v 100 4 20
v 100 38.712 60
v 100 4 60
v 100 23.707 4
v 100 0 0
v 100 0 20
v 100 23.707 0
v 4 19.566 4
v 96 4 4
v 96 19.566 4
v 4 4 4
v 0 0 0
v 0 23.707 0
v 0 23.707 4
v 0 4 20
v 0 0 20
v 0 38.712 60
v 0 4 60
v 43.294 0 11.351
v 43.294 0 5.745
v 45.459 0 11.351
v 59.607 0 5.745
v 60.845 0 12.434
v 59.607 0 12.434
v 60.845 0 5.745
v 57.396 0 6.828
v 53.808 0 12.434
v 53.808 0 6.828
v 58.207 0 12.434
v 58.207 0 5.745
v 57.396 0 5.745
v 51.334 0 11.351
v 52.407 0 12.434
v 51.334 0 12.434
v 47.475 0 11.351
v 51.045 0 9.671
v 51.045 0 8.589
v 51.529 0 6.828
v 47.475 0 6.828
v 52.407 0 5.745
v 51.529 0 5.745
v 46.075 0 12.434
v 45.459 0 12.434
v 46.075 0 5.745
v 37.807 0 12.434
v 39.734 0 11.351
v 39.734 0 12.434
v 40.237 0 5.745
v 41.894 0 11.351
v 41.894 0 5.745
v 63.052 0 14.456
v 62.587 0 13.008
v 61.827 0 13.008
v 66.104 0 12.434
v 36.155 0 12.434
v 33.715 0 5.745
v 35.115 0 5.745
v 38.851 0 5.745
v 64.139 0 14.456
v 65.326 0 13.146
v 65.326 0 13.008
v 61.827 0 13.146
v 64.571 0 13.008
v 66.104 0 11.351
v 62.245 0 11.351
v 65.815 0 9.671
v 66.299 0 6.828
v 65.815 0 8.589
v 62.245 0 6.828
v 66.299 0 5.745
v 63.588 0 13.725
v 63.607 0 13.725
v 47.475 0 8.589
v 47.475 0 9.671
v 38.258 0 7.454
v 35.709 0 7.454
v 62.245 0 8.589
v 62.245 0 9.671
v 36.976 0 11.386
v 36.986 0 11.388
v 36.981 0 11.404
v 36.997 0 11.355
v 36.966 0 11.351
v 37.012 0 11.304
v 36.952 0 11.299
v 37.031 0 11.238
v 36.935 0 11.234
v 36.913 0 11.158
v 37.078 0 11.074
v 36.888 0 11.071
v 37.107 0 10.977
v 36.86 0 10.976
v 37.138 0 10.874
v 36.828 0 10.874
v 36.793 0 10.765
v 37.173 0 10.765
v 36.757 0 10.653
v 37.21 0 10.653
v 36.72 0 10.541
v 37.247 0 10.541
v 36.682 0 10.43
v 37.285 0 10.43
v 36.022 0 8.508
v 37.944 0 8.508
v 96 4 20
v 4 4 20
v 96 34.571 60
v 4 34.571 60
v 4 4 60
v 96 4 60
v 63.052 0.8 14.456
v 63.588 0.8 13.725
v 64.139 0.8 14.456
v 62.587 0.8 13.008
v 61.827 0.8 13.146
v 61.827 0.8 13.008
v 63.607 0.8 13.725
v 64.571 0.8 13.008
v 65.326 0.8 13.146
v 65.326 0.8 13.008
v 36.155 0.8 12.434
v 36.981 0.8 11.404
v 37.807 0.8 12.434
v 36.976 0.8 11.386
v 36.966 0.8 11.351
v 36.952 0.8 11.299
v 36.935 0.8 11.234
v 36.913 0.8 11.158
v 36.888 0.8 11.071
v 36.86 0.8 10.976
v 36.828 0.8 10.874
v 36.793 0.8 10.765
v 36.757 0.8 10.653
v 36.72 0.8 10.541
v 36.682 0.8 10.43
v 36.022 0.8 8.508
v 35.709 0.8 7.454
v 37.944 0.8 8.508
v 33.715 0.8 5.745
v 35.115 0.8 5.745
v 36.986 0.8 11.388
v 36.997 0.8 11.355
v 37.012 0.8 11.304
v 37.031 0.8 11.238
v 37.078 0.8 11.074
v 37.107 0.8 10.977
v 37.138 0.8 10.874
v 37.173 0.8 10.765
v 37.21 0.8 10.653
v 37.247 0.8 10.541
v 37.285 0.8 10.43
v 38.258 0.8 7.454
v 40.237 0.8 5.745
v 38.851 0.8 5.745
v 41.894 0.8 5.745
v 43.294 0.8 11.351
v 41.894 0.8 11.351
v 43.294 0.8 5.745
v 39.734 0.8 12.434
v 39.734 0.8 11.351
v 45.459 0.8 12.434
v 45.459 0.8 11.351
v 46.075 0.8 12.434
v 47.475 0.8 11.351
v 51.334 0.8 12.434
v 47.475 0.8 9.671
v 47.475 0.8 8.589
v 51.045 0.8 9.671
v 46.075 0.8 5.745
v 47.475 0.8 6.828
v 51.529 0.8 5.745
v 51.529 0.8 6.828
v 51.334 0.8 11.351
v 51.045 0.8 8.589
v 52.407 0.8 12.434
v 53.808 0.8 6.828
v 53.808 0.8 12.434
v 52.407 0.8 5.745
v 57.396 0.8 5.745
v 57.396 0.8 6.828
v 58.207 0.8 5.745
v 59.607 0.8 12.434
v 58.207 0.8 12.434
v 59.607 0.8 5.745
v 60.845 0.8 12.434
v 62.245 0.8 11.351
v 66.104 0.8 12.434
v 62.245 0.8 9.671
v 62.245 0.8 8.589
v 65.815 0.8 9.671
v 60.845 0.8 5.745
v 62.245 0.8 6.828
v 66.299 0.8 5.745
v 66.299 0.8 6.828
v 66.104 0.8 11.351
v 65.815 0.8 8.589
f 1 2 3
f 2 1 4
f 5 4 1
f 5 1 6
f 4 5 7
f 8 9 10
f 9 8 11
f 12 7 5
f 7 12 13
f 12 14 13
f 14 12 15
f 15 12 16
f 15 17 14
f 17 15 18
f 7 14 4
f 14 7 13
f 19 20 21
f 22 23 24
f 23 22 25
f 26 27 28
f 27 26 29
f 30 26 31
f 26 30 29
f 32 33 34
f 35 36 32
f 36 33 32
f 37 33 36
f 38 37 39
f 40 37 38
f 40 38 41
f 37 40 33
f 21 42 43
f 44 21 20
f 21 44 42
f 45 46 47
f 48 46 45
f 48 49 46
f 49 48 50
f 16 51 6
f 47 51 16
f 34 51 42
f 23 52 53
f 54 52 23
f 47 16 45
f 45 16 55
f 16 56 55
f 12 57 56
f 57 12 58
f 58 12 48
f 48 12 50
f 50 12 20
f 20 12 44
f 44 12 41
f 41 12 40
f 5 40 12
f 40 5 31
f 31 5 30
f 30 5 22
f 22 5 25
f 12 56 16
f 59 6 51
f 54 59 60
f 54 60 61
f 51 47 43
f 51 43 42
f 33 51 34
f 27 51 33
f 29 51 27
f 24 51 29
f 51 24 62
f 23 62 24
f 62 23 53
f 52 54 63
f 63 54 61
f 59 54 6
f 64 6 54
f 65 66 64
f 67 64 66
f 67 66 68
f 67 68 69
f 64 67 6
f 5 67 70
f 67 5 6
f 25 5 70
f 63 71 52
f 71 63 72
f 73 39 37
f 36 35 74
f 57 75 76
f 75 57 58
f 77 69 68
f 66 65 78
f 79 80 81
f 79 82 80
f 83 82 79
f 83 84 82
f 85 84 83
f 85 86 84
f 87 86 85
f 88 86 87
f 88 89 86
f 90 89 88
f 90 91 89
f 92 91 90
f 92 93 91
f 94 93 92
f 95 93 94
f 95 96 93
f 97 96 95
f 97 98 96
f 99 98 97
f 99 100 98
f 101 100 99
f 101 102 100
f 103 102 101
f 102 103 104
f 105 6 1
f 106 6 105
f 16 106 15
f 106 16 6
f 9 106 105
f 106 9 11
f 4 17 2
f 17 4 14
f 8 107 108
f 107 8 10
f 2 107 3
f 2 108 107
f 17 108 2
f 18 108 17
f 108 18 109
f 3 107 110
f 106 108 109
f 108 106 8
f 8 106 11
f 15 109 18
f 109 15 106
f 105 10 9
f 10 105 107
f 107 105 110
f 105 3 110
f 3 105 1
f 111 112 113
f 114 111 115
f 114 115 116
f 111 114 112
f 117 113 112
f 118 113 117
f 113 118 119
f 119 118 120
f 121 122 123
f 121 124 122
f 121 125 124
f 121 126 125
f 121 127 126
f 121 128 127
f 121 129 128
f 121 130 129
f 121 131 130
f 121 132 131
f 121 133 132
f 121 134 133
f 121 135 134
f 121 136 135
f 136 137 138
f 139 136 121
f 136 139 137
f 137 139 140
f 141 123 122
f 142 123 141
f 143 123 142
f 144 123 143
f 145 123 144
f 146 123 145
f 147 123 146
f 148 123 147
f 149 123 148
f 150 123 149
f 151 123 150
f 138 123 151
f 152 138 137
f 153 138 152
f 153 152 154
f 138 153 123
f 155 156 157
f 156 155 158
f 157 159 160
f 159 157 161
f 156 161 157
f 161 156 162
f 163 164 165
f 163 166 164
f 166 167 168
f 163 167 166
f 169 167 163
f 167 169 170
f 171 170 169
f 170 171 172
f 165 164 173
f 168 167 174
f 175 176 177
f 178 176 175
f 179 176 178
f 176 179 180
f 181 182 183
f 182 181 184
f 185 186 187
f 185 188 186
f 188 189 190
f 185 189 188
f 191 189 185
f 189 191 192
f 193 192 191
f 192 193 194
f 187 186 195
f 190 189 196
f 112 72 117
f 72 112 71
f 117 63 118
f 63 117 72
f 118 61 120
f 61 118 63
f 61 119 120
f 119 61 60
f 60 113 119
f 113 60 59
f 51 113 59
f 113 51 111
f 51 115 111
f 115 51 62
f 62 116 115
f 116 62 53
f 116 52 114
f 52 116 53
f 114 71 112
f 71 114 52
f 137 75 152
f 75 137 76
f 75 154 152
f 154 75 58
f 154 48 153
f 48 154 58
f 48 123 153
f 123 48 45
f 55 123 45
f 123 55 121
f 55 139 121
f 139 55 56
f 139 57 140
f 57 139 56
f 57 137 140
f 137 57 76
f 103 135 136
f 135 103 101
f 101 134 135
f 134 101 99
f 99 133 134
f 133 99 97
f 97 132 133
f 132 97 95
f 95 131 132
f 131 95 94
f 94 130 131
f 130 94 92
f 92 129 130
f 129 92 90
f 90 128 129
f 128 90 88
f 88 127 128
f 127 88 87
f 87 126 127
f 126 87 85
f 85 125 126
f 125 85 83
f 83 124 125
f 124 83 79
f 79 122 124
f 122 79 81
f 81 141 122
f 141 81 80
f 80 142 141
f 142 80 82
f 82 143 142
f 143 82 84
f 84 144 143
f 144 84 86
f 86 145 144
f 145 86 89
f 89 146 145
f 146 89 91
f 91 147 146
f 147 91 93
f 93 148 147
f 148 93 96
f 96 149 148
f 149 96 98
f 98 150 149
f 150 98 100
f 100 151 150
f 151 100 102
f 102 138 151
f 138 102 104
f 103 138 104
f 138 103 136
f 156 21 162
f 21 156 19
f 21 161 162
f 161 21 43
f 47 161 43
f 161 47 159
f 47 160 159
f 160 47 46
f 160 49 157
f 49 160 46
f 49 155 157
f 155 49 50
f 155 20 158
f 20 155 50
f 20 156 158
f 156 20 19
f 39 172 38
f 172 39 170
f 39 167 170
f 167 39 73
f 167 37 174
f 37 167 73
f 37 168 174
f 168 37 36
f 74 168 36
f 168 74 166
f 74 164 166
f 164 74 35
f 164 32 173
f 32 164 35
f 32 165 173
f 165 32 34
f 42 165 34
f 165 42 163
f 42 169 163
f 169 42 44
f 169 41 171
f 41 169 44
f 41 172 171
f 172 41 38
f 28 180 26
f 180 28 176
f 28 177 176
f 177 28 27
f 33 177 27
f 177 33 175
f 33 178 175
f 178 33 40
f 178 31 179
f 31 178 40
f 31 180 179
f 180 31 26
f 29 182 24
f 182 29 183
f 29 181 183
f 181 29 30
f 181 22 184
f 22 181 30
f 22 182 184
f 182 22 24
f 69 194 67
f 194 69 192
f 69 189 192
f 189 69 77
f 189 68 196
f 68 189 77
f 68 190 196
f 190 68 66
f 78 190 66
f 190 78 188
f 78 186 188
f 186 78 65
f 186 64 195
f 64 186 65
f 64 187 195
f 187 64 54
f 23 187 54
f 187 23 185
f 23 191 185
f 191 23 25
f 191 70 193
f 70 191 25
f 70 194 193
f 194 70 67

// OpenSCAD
CARD_W   = 90;
STACK_T  = 12;
CLEAR    = 2;
WALL     = 4;
BASE_T   = 4;
LIP_H    = 20;
END_T    = 4;
TILT     = 15;
TOP_H    = 60;
TXT      = "ATELIÊ";
TXT_SIZE = 7;
ENGRAVE  = 0.8;
FONT     = "Liberation Sans:style=Bold";
W        = CARD_W + CLEAR + 2*END_T;
GAP_H    = (STACK_T + CLEAR) / cos(TILT);
T        = tan(TILT);
LIP_T    = WALL;
WALL_H   = WALL / cos(TILT);
function y_in(z)  = LIP_T + GAP_H + z*T;
function y_out(z) = y_in(z) + WALL_H;
D        = y_out(BASE_T);
DEPTH    = y_out(TOP_H);
H        = TOP_H;
echo(str("largura X: ", W, " mm"));
echo(str("profundidade Y: ", DEPTH, " mm"));
echo(str("altura Z: ", H, " mm"));
module profile_back() {
    rotate([90, 0, 90])
        linear_extrude(height = W)
            polygon([[y_in(0), 0], [y_out(0), 0],
                     [y_out(TOP_H), TOP_H], [y_in(TOP_H), TOP_H]]);
}
module profile_side() {
    rotate([90, 0, 90])
        linear_extrude(height = END_T)
            polygon([[0, 0], [y_out(0), 0], [y_out(TOP_H), TOP_H],
                     [LIP_T, TOP_H], [LIP_T, LIP_H], [0, LIP_H]]);
}
difference() {
    union() {
        cube([W, D, BASE_T]);
        cube([W, LIP_T, LIP_H]);
        profile_back();
        profile_side();
        translate([W - END_T, 0, 0]) profile_side();
    }
    translate([W/2, ENGRAVE, LIP_H/2])
        rotate([90, 0, 0])
            linear_extrude(height = ENGRAVE + 1)
                text(TXT, size = TXT_SIZE, font = FONT,
                     halign = "center", valign = "center");
}
